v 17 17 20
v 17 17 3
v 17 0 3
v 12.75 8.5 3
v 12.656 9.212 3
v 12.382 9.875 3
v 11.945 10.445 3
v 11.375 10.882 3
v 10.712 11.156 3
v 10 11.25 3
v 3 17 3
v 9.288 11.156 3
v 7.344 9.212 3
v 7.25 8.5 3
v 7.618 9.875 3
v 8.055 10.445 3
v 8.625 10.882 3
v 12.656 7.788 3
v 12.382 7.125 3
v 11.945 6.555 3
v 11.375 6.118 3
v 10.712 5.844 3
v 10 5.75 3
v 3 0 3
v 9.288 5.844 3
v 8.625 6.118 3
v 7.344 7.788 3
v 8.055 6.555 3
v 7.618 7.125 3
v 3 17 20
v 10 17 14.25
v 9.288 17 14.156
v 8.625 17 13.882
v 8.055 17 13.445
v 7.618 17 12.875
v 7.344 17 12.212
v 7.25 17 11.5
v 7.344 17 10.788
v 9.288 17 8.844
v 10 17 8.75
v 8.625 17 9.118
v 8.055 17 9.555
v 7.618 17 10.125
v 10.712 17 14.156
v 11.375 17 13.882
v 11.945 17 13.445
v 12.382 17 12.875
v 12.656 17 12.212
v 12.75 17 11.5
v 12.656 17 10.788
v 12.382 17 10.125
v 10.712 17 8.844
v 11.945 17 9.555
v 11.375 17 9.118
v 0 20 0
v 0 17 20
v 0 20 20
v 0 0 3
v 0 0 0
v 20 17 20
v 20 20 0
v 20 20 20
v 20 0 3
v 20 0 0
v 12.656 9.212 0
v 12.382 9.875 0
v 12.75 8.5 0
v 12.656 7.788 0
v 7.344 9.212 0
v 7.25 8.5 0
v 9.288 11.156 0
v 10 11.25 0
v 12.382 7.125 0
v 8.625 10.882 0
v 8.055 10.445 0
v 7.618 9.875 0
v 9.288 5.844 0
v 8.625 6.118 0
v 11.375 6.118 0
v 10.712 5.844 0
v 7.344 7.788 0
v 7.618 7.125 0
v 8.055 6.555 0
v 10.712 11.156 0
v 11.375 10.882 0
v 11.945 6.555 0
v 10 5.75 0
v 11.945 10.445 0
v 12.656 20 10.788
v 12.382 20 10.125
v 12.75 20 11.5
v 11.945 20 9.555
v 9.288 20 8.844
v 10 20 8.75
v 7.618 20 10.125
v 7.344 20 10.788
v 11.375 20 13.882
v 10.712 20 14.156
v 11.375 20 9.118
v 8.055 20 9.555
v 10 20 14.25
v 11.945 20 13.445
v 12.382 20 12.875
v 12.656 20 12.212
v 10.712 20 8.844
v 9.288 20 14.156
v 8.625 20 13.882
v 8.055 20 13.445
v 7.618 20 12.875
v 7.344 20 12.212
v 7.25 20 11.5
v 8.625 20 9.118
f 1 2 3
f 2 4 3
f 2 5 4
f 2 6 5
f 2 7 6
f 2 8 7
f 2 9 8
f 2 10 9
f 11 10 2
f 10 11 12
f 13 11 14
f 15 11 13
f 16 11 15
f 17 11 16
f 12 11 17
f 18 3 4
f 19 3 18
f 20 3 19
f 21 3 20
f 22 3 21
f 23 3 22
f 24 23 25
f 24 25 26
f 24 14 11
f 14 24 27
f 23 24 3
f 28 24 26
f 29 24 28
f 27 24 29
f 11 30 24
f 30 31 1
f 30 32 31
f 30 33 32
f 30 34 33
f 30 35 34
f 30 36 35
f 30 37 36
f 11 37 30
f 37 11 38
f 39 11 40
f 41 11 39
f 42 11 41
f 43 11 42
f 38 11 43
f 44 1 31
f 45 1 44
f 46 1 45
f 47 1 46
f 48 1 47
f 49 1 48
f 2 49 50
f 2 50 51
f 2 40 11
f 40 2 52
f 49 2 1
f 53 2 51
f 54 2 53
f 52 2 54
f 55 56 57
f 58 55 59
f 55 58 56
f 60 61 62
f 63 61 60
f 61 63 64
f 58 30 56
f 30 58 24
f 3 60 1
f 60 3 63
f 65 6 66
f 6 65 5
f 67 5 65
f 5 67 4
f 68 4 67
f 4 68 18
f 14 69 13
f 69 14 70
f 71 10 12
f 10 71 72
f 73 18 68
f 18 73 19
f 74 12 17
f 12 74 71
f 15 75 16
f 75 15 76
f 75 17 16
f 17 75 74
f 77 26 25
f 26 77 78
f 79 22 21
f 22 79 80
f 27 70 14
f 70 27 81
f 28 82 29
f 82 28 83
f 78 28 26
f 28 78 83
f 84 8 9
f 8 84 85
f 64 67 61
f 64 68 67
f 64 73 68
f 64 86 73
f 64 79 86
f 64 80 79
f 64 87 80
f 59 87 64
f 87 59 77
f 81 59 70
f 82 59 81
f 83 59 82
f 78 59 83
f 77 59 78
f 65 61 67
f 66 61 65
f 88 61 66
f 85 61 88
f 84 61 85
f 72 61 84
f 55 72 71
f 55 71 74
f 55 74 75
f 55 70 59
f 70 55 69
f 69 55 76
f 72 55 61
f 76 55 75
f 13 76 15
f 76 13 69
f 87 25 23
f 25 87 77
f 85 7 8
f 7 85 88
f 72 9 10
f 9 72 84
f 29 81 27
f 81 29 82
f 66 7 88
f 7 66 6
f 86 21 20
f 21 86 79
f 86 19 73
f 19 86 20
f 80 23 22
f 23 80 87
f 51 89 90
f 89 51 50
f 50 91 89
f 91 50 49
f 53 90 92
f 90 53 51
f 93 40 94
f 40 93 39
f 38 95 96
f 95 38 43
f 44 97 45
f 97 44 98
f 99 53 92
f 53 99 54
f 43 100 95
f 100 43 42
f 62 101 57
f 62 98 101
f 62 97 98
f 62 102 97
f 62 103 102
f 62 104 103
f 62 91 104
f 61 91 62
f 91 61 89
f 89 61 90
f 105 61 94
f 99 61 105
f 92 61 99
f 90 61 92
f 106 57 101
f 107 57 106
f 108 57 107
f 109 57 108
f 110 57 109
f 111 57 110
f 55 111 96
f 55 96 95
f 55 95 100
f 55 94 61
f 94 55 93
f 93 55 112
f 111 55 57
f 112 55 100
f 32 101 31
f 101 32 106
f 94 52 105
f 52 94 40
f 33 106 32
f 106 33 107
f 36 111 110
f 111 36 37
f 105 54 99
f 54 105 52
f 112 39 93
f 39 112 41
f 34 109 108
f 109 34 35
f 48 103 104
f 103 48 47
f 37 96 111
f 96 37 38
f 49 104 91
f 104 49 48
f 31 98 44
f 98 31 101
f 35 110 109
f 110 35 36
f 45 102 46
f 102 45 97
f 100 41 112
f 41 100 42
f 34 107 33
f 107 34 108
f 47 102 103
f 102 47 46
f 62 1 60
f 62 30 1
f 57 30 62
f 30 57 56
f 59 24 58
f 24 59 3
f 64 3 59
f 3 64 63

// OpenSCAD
difference()
{
    translate([0,0,0])
        cube([20,20,20]);
    
    union()
    {
        translate([3,0,3])
            cube([14,17,17]);
        
        translate([0,0,3])
            rotate([45,0,0])
                cube([20,30,20]);
        
        translate([10,17/2,0])
            cylinder(d=5.5,h=3,$fn=24);
        
        translate([10,17,3+17/2])
            rotate([270,0,0])
                cylinder(d=5.5,h=3,$fn=24);
    }
    
}
